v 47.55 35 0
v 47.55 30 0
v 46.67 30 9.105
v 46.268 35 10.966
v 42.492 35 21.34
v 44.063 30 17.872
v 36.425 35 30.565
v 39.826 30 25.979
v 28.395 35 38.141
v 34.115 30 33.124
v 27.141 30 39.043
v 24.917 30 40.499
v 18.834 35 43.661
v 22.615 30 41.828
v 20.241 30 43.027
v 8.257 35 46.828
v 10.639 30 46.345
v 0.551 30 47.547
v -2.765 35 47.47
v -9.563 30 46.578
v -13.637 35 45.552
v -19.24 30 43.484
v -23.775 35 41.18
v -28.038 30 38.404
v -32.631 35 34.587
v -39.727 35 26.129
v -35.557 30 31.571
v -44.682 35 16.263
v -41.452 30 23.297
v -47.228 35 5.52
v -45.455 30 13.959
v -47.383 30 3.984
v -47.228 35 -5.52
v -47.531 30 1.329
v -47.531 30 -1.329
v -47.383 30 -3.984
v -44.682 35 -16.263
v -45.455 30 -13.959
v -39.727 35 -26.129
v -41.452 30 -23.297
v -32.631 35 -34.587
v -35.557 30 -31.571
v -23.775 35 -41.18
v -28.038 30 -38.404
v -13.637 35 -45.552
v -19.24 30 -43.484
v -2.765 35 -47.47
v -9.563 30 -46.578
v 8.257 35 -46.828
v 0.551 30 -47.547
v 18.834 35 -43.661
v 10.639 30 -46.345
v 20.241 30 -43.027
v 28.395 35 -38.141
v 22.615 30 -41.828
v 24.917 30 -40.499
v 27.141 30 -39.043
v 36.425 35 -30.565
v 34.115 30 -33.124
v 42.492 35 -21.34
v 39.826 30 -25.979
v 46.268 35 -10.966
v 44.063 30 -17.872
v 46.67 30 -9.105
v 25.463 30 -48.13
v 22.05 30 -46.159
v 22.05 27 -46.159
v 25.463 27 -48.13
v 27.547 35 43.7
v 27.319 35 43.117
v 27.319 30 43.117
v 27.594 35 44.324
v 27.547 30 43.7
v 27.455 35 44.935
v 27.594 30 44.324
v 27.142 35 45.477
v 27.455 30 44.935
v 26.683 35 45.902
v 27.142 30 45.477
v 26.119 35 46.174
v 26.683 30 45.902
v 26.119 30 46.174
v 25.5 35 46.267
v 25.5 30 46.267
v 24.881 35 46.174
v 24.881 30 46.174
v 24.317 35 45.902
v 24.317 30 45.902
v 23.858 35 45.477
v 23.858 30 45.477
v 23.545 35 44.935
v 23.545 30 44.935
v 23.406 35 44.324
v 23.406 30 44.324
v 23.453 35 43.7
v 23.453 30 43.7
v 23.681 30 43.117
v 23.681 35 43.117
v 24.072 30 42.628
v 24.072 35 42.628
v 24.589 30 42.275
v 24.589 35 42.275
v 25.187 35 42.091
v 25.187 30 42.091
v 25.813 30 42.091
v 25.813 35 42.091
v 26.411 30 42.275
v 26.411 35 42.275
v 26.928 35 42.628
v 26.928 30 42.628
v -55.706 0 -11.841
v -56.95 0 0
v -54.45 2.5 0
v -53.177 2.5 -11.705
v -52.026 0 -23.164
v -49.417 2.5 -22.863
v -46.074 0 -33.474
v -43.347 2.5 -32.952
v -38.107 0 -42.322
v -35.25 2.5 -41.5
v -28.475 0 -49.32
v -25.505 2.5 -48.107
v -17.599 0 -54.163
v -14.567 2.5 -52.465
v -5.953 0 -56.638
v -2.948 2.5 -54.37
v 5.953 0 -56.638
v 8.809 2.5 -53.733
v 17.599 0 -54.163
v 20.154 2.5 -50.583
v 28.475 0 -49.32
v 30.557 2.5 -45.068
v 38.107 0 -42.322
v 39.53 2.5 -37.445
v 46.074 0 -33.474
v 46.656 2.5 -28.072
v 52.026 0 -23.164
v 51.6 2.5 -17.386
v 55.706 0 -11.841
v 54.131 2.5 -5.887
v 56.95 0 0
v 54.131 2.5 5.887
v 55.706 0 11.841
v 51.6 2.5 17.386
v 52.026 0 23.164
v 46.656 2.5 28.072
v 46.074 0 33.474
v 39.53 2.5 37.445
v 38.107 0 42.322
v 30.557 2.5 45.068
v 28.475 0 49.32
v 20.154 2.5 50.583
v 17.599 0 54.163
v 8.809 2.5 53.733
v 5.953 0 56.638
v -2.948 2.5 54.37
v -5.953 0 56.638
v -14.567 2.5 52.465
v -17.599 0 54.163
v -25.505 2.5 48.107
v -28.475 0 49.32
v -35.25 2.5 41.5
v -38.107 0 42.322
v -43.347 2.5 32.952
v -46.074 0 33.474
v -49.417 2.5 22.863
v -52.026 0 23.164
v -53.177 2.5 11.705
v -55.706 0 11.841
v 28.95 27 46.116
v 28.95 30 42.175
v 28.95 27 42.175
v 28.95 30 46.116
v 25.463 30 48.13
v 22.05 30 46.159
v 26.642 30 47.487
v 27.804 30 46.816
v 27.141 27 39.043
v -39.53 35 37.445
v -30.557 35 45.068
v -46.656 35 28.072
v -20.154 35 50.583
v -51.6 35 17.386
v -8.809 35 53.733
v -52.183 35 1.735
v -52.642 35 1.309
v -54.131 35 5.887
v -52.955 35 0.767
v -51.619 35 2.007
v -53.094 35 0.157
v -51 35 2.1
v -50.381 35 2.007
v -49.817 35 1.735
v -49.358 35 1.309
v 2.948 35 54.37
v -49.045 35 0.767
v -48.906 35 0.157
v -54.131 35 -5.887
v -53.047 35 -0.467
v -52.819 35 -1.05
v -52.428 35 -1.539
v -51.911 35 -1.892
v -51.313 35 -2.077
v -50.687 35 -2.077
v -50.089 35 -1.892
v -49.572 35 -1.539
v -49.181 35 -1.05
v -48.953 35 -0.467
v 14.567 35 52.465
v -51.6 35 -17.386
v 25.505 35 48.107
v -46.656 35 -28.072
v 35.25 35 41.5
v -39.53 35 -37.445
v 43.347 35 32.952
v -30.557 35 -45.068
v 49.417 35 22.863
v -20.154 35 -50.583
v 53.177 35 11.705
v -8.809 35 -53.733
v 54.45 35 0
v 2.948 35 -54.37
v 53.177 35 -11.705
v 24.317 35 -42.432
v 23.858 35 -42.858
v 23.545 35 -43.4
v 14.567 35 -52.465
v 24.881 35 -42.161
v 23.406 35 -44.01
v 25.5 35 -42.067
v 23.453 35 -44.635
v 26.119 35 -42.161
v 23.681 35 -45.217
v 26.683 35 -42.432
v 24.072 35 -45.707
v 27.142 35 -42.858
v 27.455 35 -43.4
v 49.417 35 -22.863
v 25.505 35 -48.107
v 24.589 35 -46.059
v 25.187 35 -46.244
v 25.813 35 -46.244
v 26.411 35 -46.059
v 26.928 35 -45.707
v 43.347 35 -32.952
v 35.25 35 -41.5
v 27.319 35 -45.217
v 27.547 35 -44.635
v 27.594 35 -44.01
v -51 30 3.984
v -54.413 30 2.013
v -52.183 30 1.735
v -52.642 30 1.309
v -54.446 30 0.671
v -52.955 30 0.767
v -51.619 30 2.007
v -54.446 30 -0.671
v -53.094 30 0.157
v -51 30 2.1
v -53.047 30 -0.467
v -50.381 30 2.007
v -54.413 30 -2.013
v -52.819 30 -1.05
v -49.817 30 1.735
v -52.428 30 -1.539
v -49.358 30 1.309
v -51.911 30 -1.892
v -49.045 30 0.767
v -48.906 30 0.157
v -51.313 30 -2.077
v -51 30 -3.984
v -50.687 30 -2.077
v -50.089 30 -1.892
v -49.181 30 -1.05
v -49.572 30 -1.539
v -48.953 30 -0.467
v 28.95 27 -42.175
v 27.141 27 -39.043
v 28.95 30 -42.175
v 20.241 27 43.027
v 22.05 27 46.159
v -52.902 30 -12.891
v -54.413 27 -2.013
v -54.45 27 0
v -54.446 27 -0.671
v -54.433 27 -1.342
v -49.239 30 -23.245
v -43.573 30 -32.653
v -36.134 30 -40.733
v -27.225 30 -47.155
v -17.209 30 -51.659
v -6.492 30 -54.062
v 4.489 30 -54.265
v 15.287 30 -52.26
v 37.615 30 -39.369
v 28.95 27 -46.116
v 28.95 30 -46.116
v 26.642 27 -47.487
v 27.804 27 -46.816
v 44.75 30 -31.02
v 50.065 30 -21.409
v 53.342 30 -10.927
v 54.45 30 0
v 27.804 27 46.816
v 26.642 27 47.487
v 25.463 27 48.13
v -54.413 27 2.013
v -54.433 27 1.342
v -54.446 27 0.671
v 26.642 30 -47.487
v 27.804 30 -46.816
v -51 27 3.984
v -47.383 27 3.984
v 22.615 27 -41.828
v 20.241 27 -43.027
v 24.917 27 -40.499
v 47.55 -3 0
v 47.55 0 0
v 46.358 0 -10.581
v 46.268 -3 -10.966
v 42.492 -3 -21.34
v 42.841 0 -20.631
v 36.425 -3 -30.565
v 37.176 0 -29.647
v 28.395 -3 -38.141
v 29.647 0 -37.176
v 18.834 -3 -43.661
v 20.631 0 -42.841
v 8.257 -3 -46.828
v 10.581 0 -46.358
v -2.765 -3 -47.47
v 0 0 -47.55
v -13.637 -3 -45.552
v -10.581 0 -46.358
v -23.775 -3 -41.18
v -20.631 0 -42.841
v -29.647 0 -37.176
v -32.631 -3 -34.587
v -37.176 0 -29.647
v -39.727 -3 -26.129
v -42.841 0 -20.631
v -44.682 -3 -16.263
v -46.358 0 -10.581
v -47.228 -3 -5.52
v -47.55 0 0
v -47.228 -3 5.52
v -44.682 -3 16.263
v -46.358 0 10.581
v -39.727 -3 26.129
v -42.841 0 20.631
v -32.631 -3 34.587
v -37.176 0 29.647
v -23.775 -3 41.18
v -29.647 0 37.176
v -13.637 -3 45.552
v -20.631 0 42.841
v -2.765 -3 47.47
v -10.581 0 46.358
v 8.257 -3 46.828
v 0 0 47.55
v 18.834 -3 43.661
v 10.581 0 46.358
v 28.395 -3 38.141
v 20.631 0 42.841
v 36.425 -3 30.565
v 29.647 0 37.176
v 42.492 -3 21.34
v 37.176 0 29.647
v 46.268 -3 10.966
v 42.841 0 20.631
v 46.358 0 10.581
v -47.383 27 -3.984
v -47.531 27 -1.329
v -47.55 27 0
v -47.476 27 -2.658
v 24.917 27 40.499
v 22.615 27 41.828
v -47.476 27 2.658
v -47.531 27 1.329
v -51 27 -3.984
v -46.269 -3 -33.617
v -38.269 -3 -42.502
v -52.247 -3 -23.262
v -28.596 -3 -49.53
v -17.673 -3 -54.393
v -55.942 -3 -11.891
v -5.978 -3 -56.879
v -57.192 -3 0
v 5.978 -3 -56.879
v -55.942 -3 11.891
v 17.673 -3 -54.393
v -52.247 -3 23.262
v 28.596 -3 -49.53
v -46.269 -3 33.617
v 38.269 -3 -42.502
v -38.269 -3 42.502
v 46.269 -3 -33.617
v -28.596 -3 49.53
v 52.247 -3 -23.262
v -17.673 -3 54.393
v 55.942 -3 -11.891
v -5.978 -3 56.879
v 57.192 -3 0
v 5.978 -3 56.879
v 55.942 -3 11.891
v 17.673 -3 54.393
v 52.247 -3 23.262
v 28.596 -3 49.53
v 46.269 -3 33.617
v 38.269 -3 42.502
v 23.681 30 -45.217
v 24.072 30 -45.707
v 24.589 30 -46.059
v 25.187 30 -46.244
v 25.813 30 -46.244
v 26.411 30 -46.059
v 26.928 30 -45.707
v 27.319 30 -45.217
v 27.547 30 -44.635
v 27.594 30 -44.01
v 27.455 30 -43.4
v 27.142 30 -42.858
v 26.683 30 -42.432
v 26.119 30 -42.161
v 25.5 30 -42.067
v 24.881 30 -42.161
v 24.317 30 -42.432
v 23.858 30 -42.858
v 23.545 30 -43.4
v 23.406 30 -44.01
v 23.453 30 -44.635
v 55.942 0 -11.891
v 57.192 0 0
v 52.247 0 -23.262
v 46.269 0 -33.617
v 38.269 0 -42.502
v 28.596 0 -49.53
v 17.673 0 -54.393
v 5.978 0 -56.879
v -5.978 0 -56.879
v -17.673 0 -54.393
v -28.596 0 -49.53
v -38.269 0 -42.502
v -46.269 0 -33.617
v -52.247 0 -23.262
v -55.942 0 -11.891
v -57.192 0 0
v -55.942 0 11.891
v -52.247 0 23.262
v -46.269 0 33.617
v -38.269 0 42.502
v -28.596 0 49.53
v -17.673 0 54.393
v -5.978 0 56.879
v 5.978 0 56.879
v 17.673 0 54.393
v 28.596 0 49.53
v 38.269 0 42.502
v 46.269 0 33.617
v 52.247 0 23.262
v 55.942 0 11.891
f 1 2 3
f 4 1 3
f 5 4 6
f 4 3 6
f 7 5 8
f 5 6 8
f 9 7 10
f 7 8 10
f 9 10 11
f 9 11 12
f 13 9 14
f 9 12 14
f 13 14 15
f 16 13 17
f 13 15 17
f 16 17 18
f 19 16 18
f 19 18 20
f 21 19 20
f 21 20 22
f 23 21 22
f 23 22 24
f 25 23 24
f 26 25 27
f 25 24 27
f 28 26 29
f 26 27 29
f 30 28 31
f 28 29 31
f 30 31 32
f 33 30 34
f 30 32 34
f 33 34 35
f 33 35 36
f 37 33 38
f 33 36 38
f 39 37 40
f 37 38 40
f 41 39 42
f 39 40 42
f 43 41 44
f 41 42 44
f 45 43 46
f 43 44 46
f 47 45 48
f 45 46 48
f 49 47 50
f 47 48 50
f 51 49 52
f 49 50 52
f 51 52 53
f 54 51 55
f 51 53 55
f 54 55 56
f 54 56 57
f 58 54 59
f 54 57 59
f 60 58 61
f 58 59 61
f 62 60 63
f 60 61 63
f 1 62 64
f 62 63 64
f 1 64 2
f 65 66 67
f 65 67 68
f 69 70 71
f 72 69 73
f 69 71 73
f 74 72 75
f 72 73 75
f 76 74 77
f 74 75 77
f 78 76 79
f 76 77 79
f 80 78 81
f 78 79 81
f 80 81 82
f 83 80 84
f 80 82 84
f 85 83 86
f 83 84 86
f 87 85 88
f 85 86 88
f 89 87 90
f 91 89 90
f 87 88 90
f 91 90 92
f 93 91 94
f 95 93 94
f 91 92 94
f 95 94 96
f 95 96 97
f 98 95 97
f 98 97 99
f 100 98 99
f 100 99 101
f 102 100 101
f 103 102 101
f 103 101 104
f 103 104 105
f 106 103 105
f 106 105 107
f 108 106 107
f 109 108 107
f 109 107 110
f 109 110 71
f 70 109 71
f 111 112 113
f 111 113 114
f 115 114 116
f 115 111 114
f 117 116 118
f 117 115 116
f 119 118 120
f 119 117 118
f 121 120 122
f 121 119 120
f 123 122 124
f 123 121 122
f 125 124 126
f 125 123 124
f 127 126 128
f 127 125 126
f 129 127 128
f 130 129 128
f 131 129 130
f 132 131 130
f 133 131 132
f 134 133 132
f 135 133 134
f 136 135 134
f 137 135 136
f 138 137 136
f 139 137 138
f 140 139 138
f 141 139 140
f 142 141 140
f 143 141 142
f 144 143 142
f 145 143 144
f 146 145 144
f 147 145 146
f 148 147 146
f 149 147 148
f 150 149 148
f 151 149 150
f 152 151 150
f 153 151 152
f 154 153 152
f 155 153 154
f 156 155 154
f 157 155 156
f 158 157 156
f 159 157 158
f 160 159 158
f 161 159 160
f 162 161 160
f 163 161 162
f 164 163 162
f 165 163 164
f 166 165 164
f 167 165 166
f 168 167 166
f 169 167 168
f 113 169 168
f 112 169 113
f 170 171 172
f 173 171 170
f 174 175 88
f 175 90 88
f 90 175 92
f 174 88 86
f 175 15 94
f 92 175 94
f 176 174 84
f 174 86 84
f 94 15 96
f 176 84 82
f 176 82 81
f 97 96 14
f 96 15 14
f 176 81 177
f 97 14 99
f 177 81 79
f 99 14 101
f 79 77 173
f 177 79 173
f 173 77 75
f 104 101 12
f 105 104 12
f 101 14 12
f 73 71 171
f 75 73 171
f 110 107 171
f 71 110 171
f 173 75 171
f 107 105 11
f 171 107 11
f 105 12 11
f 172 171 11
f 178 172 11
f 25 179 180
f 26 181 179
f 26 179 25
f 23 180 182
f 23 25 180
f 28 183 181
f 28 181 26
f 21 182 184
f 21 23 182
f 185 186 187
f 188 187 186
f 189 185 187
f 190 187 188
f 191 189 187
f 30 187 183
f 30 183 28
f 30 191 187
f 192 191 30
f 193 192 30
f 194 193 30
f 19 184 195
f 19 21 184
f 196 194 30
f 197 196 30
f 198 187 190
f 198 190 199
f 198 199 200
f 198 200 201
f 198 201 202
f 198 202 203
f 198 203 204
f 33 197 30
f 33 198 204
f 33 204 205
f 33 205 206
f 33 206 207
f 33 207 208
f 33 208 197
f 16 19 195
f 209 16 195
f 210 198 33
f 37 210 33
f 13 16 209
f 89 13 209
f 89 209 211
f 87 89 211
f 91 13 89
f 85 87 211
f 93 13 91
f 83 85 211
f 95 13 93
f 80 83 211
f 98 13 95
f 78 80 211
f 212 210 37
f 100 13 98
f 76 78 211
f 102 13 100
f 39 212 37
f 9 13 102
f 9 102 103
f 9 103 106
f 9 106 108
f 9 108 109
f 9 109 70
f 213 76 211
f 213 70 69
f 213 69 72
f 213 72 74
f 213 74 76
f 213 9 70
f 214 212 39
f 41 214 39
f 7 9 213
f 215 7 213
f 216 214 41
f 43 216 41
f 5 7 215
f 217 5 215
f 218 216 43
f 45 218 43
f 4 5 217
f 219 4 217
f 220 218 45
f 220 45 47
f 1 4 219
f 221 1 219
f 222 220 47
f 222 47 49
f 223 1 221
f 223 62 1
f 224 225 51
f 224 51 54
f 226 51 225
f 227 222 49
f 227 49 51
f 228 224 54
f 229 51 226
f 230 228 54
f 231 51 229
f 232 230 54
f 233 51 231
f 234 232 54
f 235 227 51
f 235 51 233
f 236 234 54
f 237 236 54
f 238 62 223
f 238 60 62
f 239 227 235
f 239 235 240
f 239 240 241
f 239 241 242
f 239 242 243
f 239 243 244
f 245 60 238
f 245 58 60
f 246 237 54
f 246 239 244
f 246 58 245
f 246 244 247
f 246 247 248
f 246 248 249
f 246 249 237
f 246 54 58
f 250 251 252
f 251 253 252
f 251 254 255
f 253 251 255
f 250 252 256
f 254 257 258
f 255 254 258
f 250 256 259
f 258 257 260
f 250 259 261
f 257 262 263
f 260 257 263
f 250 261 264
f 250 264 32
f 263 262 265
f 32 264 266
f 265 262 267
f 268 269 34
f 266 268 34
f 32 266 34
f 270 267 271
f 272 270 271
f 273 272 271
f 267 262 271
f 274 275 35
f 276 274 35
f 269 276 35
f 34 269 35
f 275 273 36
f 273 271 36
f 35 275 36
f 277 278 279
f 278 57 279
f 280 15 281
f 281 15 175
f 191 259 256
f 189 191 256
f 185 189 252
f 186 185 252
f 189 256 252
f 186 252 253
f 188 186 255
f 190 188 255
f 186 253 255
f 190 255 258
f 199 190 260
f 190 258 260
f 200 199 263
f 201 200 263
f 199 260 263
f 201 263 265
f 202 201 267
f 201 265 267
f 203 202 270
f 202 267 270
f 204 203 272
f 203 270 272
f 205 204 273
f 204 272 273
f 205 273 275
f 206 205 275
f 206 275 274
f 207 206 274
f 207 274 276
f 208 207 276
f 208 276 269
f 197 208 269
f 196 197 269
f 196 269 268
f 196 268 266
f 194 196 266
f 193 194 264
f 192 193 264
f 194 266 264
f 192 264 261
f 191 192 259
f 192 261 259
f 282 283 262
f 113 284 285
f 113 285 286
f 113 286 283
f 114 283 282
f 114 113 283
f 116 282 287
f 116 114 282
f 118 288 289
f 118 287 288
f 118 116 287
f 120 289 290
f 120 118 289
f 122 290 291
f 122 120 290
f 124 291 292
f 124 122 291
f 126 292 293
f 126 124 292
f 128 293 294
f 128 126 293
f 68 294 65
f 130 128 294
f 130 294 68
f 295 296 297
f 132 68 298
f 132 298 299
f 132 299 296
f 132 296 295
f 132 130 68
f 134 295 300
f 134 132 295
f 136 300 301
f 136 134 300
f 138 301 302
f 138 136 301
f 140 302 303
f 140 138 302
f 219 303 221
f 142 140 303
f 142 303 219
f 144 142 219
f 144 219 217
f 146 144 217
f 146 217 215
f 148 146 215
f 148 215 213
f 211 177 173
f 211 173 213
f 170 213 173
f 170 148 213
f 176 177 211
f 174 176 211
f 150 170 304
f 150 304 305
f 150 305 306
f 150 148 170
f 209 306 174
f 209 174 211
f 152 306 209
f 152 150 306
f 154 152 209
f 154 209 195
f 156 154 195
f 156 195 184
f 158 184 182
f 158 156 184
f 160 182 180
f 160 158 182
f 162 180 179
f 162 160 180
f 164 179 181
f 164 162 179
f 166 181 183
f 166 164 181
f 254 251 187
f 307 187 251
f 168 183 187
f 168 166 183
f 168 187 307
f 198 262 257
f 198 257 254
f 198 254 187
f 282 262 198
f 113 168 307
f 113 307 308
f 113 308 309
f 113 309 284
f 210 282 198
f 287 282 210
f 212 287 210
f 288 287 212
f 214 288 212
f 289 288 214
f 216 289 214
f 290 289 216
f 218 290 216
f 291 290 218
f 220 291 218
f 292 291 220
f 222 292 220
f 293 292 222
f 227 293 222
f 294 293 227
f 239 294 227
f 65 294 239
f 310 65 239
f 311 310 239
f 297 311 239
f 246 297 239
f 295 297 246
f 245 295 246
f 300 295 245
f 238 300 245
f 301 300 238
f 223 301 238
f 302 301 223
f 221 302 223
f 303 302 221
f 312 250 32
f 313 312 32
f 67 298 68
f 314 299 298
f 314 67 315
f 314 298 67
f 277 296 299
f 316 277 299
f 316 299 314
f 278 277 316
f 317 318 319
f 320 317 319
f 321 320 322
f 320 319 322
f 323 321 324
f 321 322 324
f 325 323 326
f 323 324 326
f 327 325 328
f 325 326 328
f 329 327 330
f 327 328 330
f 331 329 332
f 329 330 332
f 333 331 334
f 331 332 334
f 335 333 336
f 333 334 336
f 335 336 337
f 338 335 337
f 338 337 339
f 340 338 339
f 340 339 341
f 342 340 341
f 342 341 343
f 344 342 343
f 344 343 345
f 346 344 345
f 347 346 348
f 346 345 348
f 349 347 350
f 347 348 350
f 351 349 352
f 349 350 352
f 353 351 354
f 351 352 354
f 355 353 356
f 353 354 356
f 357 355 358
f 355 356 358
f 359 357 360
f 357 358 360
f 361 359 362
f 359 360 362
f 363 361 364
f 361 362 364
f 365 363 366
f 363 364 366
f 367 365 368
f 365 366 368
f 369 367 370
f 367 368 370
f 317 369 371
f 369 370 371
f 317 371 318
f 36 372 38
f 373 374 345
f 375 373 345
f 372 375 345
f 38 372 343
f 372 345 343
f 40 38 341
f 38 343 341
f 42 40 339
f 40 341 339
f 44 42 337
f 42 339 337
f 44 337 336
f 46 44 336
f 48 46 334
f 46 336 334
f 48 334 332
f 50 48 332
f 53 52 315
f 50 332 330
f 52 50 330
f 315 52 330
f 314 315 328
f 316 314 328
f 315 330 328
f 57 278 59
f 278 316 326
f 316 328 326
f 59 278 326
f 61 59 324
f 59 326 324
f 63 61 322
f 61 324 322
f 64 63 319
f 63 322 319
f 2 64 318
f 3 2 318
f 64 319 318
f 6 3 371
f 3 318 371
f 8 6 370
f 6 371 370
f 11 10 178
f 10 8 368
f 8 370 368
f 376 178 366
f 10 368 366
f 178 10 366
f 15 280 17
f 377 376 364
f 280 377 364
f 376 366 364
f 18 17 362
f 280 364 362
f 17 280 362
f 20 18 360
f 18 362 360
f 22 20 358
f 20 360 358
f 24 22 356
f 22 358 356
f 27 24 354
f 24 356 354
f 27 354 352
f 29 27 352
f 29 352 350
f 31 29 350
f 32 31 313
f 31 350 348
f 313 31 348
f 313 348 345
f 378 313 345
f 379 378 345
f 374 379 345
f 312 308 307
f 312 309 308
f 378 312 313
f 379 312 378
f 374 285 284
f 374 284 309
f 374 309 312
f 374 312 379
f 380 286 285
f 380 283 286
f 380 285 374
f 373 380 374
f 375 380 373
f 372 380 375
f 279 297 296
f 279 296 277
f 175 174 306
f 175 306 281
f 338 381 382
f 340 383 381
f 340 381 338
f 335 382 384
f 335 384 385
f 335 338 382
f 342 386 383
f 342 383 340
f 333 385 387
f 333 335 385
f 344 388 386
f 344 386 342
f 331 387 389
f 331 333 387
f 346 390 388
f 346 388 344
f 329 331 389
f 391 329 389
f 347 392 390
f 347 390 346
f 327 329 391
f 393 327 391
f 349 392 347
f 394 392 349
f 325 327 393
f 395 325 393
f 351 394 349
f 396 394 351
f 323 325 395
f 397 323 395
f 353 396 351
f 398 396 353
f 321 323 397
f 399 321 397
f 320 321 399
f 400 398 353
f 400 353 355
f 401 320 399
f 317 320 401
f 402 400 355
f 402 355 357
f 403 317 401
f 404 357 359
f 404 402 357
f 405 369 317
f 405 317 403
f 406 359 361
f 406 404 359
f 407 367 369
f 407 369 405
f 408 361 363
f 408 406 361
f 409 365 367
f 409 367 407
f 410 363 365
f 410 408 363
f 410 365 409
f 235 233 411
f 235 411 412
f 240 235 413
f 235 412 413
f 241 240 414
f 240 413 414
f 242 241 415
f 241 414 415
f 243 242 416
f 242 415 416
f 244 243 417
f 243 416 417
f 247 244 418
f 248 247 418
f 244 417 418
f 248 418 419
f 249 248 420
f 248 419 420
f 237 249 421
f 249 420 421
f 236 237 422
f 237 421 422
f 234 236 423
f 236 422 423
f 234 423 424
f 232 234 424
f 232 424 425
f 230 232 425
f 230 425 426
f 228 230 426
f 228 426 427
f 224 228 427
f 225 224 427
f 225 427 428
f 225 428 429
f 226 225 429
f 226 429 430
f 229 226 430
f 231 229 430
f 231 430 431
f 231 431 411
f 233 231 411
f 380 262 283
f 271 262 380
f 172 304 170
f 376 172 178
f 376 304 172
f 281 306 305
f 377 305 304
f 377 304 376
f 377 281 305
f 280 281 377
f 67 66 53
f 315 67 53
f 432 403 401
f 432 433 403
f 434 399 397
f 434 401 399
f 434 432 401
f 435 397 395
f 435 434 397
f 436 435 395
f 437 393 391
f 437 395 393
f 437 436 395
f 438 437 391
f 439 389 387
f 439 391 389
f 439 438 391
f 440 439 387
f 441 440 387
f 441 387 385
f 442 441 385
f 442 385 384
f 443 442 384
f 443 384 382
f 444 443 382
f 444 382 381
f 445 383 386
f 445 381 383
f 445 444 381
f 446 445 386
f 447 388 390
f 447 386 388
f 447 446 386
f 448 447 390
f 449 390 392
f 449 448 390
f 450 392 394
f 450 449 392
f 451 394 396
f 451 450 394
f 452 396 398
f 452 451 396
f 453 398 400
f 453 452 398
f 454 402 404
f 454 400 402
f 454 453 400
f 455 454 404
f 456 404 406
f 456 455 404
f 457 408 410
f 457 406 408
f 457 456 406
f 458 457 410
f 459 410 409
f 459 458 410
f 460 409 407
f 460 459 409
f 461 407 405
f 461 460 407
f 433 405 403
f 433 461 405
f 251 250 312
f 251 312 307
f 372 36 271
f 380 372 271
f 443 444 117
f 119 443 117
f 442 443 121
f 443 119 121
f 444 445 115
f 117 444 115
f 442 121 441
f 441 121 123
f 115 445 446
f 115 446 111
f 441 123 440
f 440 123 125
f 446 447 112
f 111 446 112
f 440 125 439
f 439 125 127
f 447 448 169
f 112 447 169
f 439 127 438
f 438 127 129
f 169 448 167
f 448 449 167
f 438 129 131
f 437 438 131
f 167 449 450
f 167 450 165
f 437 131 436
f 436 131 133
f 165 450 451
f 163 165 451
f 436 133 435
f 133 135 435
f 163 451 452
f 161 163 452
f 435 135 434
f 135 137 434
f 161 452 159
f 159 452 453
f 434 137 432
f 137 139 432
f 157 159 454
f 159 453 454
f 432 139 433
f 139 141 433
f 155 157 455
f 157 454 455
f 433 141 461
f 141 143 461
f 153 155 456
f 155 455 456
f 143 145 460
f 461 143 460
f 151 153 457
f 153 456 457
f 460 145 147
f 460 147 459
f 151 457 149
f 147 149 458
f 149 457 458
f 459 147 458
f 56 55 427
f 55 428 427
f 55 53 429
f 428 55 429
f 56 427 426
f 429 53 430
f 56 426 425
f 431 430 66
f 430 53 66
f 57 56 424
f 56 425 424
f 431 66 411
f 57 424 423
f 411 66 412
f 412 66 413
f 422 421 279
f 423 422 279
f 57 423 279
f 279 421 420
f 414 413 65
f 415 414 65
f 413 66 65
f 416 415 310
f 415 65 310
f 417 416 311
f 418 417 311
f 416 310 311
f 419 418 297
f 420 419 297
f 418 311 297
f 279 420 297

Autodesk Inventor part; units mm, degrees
ref_plane "YZ Plane" through (0, 0, 0) normal (1, 0, 0) x (0, 1, 0)
ref_plane "XZ Plane" through (0, 0, 0) normal (0, 1, 0) x (-1, 0, 0)
ref_plane "XY Plane" through (0, 0, 0) normal (0, 0, 1) x (1, 0, 0)
sketch "Sketch1" plane through (0, 0, 0) normal (0, 1, 0) x (-1, 0, 0)
  circle A0 centre (0, 0) radius 51
  circle A1 centre (0, 0) radius 47.55
  circle A2 centre (0, 0) radius 54.45
  dimension "d0" = 102
  dimension "d6" = 95.1
  dimension "d7" = 108.9
extrude "Extrusion1" add sketch "Sketch1" along normal blind 30 contours A0 | A2
sketch "Sketch2" plane through (0, 30, 0) normal (0, 1, 0) x (1, 0, 0)
  line L0 (-51, 3.9837) -> (-47.55, 1.9919)
  line L1 (-47.55, 1.9919) -> (-47.55, -1.9919)
  line L2 (-47.55, -1.9919) -> (-51, -3.9837)
  line L3 (-51, -3.9837) -> (-54.45, -1.9919)
  line L4 (-54.45, -1.9919) -> (-54.45, 1.9919)
  line L5 (-54.45, 1.9919) -> (-51, 3.9837)
  circle A0 centre (0, 0) radius 54.45 projected
  circle A1 centre (0, 0) radius 47.55 projected
  line L6 (-51, -3.9837) -> (-47.2749, -3.9837)
  line L7 (-47.2749, -3.9837) -> (-47.2749, 3.9837)
  line L8 (-47.2749, 3.9837) -> (-51, 3.9837)
  line L9 (-51, 3.9837) -> (-51, -3.9837)
  point P0 (-51, 0)
  point P1 (-54.4128, 2.0134)
  point P2 (-54.4128, -2.0134)
  point P3 (-47.3828, -3.9837)
  point P4 (-47.55, 0)
  point P5 (-47.3828, 3.9837)
extrude "Extrusion2" cut sketch "Sketch2" against normal blind 3 contours L8 A1 L1 L0 | L9 L3 A0 L5 | L0 L1 L2 L9 | L8 L7 L6 A1 | A1 L6 L7 L8 | L2 L1 A1 L6
pattern_circular "Circular Pattern1" count 3 over 360 about axis through (0, 0, 0) along (0, 1, 0) of "Extrusion2"
sketch "Sketch3" plane through (0, 30, 0) normal (0, 1, 0) x (1, 0, 0)
  circle A0 centre (0, 0) radius 47.55
  circle A1 centre (0, 0) radius 54.45
extrude "Extrusion3" add sketch "Sketch3" along normal blind 5
sketch "Sketch4" plane through (0, 35, 0) normal (0, 1, 0) x (1, 0, 0)
  line L0 (-76.23, 0) -> (76.23, 0) projected
  point P0 (0, 0)
  point P1 (-51, 0)
  dimension "d22" = 51
hole "Hole1" at (-51, 35, 0) direction (0, -1, 0) diameter 4.2 depth 5
pattern_circular "Circular Pattern2" count 3 over 360 about axis through (0, 0, 0) along (0, 1, 0) of "Hole1"
sketch "Sketch5" plane through (0, 0, 0) normal (0, -1, 0) x (1, 0, 0)
  circle A0 centre (0, 0) radius 47.55
  circle A1 centre (0, 0) radius 57.192
extrude "Extrusion4" add sketch "Sketch5" along normal blind 3
chamfer "Chamfer2" distance 2.5 angle 45 1 edges at (54.45, 0, 0)
properties part number "CenterCylinder_2"
